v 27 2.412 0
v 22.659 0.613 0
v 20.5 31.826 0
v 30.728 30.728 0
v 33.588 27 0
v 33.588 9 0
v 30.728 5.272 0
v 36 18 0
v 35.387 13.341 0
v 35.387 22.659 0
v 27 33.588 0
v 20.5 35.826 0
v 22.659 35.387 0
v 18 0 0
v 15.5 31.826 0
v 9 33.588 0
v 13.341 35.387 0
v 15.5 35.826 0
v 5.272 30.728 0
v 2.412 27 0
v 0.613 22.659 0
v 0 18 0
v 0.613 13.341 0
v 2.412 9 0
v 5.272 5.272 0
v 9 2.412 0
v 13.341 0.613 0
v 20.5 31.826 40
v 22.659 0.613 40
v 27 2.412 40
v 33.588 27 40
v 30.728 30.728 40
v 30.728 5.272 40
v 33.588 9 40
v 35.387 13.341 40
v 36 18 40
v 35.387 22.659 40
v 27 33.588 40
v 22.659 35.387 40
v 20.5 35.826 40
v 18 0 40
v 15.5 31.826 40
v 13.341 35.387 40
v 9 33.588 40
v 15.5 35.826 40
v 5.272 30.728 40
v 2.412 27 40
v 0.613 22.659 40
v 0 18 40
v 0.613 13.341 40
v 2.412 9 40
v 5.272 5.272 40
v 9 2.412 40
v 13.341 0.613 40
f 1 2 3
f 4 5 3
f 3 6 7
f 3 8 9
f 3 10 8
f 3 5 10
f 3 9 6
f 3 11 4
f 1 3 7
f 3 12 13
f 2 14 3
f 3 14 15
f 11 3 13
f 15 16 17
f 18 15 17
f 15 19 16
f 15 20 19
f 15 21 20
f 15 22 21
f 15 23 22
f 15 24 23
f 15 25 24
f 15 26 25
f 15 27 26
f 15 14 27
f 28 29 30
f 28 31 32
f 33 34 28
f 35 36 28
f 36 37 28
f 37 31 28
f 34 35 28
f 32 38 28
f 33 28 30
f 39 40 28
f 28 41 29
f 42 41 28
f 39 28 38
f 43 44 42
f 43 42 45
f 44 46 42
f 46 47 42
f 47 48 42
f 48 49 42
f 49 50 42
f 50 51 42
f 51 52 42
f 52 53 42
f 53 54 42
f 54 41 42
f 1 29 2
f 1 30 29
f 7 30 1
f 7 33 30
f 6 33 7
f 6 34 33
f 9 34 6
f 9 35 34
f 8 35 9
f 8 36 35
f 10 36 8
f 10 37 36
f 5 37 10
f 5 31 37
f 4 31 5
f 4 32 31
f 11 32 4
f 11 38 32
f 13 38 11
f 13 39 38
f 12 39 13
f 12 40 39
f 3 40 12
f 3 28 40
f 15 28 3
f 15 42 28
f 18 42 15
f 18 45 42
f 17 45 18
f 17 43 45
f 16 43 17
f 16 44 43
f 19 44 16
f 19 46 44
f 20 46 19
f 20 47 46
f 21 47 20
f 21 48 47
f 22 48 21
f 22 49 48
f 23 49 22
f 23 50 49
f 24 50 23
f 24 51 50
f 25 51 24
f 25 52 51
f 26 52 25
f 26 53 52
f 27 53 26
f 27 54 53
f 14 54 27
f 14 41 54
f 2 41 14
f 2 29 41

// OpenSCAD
$fn = 32;

// ----------------------------------------------------------------------
// Keyway shaft: d36 shaft, key 5 x 4 mm
// ----------------------------------------------------------------------

// --- parameters (mm) ---
shaft_r = 18;             // shaft radius
key_w = 5;                // keyway width
key_d = 4;                // keyway depth below the surface line
plate_t = 40;             // shaft length, Z (extrusion height)

shaft_d = 2 * shaft_r;  // shaft diameter
circle_step = 15;  // polygon sampling step, degrees

profile = [[13.341, 35.387], [9, 33.588], [5.272, 30.728], [2.412, 27], [0.613, 22.659], [0, 18], [0.613, 13.341], [2.412, 9], [5.272, 5.272], [9, 2.412], [13.341, 0.613], [18, 0], [22.659, 0.613], [27, 2.412], [30.728, 5.272], [33.588, 9], [35.387, 13.341], [36, 18], [35.387, 22.659], [33.588, 27], [30.728, 30.728], [27, 33.588], [22.659, 35.387], [20.5, 35.826], [20.5, 31.826], [15.5, 31.826], [15.5, 35.826]];  // primary outline, 27 points, counter clockwise

// --- the one profile operation ---
linear_extrude(height = plate_t) polygon(points = profile);
